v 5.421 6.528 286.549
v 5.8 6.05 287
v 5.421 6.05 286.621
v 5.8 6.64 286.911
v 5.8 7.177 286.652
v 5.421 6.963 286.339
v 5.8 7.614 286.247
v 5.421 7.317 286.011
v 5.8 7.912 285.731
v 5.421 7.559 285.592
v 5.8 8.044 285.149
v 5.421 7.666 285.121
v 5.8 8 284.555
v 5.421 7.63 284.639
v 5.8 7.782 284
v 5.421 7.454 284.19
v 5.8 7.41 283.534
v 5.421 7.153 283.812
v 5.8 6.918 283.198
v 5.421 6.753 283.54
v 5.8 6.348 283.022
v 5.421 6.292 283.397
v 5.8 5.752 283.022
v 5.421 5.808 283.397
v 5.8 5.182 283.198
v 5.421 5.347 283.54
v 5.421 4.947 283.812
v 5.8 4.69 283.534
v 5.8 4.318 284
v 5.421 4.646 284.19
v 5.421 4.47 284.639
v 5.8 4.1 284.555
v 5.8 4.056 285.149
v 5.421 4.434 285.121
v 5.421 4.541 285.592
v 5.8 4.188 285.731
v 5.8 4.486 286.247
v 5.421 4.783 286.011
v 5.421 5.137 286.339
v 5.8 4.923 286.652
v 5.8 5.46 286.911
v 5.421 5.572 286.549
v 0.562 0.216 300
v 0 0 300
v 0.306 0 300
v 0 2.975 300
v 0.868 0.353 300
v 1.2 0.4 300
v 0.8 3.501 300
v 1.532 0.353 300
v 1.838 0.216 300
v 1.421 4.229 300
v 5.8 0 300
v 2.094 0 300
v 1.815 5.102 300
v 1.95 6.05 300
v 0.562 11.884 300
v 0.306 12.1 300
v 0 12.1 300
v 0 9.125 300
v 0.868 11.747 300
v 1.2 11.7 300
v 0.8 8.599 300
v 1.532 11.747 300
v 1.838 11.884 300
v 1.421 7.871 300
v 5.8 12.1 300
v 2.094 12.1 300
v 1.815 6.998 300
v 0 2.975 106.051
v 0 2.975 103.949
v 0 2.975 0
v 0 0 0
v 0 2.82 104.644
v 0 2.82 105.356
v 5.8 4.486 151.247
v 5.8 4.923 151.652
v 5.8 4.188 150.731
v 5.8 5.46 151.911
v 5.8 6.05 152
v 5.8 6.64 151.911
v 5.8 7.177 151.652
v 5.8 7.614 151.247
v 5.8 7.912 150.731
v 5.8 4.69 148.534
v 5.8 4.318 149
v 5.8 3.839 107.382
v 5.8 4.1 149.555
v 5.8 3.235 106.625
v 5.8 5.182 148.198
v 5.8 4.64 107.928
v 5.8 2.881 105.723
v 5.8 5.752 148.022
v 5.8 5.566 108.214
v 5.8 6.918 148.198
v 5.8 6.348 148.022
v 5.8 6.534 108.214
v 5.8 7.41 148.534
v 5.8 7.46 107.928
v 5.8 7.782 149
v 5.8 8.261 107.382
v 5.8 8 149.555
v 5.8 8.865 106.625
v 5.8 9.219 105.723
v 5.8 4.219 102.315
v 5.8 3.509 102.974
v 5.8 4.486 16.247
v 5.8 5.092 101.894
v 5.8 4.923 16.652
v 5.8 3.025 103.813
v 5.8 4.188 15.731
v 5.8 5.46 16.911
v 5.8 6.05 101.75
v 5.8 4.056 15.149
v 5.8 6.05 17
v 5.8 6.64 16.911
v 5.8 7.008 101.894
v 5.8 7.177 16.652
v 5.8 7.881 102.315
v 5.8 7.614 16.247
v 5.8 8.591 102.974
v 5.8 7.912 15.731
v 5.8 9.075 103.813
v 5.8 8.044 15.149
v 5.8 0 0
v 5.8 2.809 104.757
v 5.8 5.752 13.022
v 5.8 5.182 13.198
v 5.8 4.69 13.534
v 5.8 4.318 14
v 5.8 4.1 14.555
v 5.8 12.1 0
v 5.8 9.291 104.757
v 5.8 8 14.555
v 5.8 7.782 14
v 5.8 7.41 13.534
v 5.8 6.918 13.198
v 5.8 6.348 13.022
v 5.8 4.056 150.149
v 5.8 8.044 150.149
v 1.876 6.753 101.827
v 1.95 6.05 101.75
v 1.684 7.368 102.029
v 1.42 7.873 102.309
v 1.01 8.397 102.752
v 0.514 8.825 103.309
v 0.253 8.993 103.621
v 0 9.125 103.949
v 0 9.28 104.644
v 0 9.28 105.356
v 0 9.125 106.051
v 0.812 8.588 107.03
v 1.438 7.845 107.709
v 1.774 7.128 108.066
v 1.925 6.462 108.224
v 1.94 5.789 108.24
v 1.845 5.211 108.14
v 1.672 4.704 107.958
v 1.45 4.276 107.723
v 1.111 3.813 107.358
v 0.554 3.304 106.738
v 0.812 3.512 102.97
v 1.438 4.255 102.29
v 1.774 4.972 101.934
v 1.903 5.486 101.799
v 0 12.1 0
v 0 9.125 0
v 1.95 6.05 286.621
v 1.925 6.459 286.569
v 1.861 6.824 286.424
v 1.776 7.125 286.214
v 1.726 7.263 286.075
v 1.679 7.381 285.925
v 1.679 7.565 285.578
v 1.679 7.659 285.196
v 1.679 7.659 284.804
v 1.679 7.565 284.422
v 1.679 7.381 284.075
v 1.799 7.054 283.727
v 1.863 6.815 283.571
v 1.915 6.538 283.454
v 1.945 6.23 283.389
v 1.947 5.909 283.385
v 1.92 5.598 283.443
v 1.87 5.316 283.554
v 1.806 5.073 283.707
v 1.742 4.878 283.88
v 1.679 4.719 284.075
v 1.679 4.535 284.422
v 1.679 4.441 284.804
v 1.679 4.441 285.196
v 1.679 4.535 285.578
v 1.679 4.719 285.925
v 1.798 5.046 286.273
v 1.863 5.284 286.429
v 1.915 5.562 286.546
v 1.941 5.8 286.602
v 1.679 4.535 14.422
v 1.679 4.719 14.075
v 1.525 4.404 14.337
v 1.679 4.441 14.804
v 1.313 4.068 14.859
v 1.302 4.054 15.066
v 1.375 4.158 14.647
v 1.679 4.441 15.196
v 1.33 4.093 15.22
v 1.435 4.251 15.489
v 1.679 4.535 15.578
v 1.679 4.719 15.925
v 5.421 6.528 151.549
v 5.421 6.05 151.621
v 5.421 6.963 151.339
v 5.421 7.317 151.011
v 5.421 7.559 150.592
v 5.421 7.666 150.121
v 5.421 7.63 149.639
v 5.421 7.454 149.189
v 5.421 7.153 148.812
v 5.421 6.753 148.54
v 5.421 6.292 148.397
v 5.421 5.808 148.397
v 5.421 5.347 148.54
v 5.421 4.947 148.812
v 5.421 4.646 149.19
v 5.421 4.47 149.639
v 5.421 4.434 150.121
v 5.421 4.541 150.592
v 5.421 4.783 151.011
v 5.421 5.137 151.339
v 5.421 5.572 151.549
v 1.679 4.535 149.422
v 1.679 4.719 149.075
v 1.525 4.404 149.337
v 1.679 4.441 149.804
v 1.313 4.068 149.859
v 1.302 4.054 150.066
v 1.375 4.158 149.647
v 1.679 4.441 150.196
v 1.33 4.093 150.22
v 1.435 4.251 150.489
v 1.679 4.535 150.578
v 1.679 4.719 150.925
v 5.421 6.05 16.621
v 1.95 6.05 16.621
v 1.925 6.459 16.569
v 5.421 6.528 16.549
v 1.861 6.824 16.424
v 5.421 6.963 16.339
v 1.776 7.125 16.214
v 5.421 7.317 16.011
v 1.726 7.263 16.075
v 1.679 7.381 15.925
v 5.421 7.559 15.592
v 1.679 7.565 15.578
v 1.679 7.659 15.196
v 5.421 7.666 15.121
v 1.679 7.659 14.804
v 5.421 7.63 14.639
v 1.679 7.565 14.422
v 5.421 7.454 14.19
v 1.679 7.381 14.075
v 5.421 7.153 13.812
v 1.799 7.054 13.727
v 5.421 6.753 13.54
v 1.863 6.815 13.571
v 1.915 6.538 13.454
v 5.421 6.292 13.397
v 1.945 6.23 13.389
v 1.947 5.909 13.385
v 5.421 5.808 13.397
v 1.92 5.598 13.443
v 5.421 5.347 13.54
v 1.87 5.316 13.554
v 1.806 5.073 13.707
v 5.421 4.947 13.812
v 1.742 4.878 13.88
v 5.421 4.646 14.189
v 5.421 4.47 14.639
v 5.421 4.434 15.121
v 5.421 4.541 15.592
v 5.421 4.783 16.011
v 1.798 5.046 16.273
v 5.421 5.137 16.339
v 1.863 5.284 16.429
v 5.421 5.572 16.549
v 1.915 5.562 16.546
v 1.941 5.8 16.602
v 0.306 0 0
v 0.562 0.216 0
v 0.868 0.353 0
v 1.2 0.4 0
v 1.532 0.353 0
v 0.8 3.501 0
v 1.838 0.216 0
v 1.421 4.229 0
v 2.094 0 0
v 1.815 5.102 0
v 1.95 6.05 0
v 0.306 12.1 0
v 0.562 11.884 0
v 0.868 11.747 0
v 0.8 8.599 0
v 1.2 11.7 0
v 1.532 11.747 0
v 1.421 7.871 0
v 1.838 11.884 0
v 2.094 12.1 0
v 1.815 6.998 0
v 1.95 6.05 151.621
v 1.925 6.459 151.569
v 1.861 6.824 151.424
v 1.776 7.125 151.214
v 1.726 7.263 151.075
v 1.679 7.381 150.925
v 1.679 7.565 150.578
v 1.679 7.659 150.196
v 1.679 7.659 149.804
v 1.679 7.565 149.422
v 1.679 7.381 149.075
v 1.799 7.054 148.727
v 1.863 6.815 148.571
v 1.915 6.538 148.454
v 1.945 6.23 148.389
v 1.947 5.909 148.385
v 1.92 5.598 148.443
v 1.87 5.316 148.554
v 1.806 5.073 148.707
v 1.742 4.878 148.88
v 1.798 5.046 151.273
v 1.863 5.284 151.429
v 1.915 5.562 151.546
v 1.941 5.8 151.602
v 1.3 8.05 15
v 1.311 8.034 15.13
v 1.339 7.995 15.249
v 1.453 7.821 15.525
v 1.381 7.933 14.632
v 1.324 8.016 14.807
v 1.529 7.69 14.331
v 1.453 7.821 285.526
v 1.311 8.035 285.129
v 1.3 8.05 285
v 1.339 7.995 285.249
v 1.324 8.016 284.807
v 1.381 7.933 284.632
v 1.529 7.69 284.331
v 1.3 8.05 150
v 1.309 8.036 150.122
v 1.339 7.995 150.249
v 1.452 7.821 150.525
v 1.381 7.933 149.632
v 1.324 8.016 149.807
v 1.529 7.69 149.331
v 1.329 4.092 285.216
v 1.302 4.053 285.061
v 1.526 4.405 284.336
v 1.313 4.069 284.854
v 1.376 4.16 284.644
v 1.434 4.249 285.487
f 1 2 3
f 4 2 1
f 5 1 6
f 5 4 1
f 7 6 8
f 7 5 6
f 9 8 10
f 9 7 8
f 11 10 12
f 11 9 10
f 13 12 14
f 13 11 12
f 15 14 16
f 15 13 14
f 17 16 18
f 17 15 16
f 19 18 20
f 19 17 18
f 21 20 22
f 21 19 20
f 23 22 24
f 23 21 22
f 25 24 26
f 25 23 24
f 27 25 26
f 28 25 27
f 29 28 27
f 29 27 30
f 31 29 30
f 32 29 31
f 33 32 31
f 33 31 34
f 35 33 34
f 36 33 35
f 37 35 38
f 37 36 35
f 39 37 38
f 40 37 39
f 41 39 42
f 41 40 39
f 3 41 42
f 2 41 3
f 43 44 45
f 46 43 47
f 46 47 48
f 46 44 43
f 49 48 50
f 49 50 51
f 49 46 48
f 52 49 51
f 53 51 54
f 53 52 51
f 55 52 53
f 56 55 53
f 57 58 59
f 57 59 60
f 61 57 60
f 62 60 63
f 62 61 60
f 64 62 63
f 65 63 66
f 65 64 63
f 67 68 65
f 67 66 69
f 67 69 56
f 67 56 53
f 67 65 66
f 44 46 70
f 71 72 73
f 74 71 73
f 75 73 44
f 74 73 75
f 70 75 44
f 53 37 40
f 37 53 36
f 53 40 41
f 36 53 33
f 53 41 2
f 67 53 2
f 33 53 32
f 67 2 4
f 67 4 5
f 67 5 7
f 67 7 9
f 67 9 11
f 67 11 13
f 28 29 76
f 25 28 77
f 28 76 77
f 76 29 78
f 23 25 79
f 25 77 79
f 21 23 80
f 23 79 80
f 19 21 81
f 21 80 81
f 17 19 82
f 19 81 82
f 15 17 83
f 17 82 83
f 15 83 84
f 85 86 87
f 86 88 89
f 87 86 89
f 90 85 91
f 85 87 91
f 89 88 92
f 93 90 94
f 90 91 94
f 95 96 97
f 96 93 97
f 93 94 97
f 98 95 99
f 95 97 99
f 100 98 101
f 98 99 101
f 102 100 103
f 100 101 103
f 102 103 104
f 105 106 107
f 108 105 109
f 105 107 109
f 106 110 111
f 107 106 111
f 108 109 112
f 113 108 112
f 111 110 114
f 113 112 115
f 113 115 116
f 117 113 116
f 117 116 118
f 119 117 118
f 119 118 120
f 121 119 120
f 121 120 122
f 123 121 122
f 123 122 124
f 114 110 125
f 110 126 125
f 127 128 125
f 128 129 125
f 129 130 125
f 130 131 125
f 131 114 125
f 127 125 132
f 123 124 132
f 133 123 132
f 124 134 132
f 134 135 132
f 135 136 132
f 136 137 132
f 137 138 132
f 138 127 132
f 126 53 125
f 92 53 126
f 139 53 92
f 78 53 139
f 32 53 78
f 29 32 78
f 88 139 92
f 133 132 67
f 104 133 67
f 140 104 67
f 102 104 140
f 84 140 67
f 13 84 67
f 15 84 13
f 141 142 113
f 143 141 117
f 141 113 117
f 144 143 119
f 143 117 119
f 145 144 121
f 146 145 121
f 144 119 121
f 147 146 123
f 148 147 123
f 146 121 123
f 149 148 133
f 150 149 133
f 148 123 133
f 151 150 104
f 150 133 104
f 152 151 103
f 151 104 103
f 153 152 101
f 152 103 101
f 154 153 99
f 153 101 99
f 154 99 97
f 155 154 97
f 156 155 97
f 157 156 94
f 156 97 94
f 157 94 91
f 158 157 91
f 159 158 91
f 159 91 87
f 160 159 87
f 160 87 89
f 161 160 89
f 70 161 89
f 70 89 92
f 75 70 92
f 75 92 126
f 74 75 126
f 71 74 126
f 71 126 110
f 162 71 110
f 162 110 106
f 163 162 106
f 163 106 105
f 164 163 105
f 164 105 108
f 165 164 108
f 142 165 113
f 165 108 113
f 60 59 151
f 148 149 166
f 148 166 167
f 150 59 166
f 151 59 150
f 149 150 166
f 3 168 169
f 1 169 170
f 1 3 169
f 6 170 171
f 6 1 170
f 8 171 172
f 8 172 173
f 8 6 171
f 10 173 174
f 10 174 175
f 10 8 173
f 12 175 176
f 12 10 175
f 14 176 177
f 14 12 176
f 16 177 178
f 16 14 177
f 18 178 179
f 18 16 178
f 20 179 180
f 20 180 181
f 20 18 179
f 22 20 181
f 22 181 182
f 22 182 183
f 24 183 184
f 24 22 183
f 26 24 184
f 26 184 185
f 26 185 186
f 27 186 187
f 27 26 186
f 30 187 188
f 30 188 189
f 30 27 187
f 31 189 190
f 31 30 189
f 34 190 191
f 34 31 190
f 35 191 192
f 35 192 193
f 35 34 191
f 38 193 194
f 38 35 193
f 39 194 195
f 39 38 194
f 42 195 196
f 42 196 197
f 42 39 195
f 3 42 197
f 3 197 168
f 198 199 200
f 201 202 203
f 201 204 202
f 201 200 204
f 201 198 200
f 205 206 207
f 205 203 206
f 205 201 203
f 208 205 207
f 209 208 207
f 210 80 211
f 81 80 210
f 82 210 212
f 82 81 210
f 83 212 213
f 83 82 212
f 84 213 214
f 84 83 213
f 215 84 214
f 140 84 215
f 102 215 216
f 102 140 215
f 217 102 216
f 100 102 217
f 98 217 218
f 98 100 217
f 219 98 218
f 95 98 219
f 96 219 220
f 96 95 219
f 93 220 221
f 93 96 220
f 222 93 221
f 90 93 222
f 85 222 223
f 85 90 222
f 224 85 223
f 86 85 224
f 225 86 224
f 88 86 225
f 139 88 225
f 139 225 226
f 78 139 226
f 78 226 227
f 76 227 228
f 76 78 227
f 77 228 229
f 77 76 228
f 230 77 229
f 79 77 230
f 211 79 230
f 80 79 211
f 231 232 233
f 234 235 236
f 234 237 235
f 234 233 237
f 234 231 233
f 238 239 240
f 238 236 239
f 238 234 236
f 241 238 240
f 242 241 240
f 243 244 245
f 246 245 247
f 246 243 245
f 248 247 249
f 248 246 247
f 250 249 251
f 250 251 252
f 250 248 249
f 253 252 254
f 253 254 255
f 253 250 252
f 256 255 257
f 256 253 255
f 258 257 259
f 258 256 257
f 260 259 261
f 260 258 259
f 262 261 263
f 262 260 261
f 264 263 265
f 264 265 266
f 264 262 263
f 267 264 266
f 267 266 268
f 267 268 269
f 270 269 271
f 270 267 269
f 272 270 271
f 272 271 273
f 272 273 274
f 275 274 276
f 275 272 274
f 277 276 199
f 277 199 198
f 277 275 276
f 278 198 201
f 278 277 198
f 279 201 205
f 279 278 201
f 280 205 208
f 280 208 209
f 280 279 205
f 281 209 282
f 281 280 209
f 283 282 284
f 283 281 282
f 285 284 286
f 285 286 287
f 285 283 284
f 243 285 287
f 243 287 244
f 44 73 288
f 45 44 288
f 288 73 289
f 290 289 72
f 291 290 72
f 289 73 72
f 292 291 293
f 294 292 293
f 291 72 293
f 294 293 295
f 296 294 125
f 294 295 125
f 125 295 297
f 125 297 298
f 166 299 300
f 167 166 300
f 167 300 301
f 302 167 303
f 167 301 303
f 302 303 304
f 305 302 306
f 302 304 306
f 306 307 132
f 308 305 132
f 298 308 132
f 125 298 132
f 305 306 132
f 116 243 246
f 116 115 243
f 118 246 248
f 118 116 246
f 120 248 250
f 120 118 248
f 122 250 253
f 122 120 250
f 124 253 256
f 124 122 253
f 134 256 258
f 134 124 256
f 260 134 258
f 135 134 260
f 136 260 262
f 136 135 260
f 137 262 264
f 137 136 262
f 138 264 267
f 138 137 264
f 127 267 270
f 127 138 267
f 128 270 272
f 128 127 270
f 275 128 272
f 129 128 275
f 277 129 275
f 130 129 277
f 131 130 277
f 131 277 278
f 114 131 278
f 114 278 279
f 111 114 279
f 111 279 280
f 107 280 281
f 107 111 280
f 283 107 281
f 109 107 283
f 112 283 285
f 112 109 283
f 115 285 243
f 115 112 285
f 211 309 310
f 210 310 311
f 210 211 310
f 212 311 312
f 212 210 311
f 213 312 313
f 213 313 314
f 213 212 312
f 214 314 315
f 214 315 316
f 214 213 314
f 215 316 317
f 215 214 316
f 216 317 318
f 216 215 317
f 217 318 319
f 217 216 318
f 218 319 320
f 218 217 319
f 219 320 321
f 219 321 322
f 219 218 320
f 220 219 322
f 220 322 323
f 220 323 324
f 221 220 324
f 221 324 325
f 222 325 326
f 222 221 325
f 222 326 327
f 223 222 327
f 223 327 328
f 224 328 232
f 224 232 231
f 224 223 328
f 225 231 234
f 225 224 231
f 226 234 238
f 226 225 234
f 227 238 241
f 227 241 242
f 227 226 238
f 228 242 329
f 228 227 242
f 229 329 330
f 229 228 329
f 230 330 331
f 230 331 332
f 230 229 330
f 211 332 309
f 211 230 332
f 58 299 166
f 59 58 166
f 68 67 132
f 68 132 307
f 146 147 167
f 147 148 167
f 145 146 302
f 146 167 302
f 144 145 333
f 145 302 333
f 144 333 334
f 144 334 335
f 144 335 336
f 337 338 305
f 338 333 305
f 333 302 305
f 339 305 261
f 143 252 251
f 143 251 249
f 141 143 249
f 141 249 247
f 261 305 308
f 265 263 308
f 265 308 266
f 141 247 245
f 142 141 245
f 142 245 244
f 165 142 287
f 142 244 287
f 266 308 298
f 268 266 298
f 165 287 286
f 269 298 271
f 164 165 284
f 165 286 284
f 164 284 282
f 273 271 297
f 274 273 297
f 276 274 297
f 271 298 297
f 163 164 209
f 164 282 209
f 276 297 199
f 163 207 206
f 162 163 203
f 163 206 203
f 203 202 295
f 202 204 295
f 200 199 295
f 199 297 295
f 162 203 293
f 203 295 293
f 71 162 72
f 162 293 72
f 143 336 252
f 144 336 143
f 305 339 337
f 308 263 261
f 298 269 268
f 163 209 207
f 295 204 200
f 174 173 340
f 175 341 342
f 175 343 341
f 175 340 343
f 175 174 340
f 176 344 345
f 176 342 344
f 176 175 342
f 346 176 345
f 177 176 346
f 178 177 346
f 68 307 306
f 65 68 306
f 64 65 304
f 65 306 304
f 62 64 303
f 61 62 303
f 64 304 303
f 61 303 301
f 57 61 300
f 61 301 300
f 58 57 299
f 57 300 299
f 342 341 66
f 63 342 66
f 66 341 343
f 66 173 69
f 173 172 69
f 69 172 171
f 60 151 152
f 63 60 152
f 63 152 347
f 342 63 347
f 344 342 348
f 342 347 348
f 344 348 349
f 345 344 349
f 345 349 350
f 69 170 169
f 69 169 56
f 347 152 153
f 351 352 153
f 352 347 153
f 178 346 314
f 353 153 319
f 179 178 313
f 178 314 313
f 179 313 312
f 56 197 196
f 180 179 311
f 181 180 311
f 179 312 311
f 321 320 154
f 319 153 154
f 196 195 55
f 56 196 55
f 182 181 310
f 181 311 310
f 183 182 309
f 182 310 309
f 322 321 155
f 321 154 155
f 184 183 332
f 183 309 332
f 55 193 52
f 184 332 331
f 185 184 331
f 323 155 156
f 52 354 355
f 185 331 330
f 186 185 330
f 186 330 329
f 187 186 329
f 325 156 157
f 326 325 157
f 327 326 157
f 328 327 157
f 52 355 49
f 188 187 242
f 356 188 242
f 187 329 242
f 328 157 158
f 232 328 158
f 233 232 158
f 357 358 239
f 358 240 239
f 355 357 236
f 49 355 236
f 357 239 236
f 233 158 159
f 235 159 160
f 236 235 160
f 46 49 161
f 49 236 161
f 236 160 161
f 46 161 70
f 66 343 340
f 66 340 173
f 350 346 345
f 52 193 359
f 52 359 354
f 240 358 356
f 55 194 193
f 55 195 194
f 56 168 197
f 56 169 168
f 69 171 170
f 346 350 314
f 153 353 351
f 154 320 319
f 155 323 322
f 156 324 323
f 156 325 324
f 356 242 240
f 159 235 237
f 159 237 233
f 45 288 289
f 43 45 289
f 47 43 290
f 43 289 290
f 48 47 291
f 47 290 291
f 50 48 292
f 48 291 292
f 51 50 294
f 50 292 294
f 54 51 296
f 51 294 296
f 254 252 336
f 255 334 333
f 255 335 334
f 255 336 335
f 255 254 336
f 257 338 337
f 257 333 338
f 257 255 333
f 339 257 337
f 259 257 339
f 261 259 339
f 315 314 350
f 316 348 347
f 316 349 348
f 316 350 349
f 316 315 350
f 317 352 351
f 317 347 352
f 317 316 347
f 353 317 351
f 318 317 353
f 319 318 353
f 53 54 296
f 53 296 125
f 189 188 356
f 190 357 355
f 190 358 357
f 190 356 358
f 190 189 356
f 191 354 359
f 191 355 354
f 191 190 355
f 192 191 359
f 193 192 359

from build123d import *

# Parameters (mm, degrees)
BOSS_EXTRUDE1_DEPTH = 300
SKETCH5_R           = 3.25
CUT_EXTRUDE1_DEPTH  = 6


with BuildPart() as part:
    # Sketch1 → Boss-Extrude1 (new body)
    with BuildSketch(Plane.XY):
        with BuildLine():
            Line((0, 2.974695137), (0, 0))
            Line((0, 0), (0.305572809, 0))
            ThreePointArc((0.305572809, 0), (1.2, 0.4), (2.094427191, 0))
            Line((2.094427191, 0), (5.8, 0))
            Line((5.8, 0), (5.8, 12.1))
            Line((5.8, 12.1), (2.094427191, 12.1))
            ThreePointArc((2.094427191, 12.1), (1.2, 11.7), (0.305572809, 12.1))
            Line((0.305572809, 12.1), (0, 12.1))
            Line((0, 12.1), (0, 9.125304863))
            ThreePointArc((0, 9.125304863), (1.95, 6.05), (0, 2.974695137))
        make_face()
    extrude(amount=BOSS_EXTRUDE1_DEPTH)

    # Sketch2 → Cut-Revolve1 (revolve, cut)
    with BuildSketch(Plane.XY.offset(15), mode=Mode.PRIVATE) as cut_revolve1_sk:
        Polygon((1.299545417, 6.05), (1.299545417, 8.05), (1.678545417, 7.671), (5.421, 7.671), (5.8, 8.05), (5.8, 6.05), align=None)
    revolve(cut_revolve1_sk.sketch.rotate(Axis((5.8, 6.05, 15), (-1, 0, 0)), 270), axis=Axis((5.8, 6.05, 15), (-1, 0, 0)), mode=Mode.SUBTRACT)

    # Sketch3 → Cut-Revolve2 (revolve, cut)
    with BuildSketch(Plane.XY.offset(285), mode=Mode.PRIVATE) as cut_revolve2_sk:
        Polygon((1.299545417, 6.05), (1.299545417, 8.05), (1.678545417, 7.671), (5.421, 7.671), (5.8, 8.05), (5.8, 6.05), align=None)
    revolve(cut_revolve2_sk.sketch.rotate(Axis((5.8, 6.05, 285), (-1, 0, 0)), 270), axis=Axis((5.8, 6.05, 285), (-1, 0, 0)), mode=Mode.SUBTRACT)

    # Sketch4 → Cut-Revolve3 (revolve, cut)
    with BuildSketch(Plane.XY.offset(150), mode=Mode.PRIVATE) as cut_revolve3_sk:
        Polygon((1.299545417, 6.05), (1.299545417, 8.05), (1.678545417, 7.671), (5.421, 7.671), (5.8, 8.05), (5.8, 6.05), align=None)
    revolve(cut_revolve3_sk.sketch.rotate(Axis((5.8, 6.05, 150), (-1, 0, 0)), 270), axis=Axis((5.8, 6.05, 150), (-1, 0, 0)), mode=Mode.SUBTRACT)

    # Sketch5 → Cut-Extrude1 (cut)
    with BuildSketch(Plane(origin=(5.8, 0, 0), x_dir=(0, 0, -1), z_dir=(1, 0, 0))):
        with Locations((-105, 6.05)):
            Circle(SKETCH5_R)
    extrude(amount=-CUT_EXTRUDE1_DEPTH, mode=Mode.SUBTRACT)


solid = part.part
